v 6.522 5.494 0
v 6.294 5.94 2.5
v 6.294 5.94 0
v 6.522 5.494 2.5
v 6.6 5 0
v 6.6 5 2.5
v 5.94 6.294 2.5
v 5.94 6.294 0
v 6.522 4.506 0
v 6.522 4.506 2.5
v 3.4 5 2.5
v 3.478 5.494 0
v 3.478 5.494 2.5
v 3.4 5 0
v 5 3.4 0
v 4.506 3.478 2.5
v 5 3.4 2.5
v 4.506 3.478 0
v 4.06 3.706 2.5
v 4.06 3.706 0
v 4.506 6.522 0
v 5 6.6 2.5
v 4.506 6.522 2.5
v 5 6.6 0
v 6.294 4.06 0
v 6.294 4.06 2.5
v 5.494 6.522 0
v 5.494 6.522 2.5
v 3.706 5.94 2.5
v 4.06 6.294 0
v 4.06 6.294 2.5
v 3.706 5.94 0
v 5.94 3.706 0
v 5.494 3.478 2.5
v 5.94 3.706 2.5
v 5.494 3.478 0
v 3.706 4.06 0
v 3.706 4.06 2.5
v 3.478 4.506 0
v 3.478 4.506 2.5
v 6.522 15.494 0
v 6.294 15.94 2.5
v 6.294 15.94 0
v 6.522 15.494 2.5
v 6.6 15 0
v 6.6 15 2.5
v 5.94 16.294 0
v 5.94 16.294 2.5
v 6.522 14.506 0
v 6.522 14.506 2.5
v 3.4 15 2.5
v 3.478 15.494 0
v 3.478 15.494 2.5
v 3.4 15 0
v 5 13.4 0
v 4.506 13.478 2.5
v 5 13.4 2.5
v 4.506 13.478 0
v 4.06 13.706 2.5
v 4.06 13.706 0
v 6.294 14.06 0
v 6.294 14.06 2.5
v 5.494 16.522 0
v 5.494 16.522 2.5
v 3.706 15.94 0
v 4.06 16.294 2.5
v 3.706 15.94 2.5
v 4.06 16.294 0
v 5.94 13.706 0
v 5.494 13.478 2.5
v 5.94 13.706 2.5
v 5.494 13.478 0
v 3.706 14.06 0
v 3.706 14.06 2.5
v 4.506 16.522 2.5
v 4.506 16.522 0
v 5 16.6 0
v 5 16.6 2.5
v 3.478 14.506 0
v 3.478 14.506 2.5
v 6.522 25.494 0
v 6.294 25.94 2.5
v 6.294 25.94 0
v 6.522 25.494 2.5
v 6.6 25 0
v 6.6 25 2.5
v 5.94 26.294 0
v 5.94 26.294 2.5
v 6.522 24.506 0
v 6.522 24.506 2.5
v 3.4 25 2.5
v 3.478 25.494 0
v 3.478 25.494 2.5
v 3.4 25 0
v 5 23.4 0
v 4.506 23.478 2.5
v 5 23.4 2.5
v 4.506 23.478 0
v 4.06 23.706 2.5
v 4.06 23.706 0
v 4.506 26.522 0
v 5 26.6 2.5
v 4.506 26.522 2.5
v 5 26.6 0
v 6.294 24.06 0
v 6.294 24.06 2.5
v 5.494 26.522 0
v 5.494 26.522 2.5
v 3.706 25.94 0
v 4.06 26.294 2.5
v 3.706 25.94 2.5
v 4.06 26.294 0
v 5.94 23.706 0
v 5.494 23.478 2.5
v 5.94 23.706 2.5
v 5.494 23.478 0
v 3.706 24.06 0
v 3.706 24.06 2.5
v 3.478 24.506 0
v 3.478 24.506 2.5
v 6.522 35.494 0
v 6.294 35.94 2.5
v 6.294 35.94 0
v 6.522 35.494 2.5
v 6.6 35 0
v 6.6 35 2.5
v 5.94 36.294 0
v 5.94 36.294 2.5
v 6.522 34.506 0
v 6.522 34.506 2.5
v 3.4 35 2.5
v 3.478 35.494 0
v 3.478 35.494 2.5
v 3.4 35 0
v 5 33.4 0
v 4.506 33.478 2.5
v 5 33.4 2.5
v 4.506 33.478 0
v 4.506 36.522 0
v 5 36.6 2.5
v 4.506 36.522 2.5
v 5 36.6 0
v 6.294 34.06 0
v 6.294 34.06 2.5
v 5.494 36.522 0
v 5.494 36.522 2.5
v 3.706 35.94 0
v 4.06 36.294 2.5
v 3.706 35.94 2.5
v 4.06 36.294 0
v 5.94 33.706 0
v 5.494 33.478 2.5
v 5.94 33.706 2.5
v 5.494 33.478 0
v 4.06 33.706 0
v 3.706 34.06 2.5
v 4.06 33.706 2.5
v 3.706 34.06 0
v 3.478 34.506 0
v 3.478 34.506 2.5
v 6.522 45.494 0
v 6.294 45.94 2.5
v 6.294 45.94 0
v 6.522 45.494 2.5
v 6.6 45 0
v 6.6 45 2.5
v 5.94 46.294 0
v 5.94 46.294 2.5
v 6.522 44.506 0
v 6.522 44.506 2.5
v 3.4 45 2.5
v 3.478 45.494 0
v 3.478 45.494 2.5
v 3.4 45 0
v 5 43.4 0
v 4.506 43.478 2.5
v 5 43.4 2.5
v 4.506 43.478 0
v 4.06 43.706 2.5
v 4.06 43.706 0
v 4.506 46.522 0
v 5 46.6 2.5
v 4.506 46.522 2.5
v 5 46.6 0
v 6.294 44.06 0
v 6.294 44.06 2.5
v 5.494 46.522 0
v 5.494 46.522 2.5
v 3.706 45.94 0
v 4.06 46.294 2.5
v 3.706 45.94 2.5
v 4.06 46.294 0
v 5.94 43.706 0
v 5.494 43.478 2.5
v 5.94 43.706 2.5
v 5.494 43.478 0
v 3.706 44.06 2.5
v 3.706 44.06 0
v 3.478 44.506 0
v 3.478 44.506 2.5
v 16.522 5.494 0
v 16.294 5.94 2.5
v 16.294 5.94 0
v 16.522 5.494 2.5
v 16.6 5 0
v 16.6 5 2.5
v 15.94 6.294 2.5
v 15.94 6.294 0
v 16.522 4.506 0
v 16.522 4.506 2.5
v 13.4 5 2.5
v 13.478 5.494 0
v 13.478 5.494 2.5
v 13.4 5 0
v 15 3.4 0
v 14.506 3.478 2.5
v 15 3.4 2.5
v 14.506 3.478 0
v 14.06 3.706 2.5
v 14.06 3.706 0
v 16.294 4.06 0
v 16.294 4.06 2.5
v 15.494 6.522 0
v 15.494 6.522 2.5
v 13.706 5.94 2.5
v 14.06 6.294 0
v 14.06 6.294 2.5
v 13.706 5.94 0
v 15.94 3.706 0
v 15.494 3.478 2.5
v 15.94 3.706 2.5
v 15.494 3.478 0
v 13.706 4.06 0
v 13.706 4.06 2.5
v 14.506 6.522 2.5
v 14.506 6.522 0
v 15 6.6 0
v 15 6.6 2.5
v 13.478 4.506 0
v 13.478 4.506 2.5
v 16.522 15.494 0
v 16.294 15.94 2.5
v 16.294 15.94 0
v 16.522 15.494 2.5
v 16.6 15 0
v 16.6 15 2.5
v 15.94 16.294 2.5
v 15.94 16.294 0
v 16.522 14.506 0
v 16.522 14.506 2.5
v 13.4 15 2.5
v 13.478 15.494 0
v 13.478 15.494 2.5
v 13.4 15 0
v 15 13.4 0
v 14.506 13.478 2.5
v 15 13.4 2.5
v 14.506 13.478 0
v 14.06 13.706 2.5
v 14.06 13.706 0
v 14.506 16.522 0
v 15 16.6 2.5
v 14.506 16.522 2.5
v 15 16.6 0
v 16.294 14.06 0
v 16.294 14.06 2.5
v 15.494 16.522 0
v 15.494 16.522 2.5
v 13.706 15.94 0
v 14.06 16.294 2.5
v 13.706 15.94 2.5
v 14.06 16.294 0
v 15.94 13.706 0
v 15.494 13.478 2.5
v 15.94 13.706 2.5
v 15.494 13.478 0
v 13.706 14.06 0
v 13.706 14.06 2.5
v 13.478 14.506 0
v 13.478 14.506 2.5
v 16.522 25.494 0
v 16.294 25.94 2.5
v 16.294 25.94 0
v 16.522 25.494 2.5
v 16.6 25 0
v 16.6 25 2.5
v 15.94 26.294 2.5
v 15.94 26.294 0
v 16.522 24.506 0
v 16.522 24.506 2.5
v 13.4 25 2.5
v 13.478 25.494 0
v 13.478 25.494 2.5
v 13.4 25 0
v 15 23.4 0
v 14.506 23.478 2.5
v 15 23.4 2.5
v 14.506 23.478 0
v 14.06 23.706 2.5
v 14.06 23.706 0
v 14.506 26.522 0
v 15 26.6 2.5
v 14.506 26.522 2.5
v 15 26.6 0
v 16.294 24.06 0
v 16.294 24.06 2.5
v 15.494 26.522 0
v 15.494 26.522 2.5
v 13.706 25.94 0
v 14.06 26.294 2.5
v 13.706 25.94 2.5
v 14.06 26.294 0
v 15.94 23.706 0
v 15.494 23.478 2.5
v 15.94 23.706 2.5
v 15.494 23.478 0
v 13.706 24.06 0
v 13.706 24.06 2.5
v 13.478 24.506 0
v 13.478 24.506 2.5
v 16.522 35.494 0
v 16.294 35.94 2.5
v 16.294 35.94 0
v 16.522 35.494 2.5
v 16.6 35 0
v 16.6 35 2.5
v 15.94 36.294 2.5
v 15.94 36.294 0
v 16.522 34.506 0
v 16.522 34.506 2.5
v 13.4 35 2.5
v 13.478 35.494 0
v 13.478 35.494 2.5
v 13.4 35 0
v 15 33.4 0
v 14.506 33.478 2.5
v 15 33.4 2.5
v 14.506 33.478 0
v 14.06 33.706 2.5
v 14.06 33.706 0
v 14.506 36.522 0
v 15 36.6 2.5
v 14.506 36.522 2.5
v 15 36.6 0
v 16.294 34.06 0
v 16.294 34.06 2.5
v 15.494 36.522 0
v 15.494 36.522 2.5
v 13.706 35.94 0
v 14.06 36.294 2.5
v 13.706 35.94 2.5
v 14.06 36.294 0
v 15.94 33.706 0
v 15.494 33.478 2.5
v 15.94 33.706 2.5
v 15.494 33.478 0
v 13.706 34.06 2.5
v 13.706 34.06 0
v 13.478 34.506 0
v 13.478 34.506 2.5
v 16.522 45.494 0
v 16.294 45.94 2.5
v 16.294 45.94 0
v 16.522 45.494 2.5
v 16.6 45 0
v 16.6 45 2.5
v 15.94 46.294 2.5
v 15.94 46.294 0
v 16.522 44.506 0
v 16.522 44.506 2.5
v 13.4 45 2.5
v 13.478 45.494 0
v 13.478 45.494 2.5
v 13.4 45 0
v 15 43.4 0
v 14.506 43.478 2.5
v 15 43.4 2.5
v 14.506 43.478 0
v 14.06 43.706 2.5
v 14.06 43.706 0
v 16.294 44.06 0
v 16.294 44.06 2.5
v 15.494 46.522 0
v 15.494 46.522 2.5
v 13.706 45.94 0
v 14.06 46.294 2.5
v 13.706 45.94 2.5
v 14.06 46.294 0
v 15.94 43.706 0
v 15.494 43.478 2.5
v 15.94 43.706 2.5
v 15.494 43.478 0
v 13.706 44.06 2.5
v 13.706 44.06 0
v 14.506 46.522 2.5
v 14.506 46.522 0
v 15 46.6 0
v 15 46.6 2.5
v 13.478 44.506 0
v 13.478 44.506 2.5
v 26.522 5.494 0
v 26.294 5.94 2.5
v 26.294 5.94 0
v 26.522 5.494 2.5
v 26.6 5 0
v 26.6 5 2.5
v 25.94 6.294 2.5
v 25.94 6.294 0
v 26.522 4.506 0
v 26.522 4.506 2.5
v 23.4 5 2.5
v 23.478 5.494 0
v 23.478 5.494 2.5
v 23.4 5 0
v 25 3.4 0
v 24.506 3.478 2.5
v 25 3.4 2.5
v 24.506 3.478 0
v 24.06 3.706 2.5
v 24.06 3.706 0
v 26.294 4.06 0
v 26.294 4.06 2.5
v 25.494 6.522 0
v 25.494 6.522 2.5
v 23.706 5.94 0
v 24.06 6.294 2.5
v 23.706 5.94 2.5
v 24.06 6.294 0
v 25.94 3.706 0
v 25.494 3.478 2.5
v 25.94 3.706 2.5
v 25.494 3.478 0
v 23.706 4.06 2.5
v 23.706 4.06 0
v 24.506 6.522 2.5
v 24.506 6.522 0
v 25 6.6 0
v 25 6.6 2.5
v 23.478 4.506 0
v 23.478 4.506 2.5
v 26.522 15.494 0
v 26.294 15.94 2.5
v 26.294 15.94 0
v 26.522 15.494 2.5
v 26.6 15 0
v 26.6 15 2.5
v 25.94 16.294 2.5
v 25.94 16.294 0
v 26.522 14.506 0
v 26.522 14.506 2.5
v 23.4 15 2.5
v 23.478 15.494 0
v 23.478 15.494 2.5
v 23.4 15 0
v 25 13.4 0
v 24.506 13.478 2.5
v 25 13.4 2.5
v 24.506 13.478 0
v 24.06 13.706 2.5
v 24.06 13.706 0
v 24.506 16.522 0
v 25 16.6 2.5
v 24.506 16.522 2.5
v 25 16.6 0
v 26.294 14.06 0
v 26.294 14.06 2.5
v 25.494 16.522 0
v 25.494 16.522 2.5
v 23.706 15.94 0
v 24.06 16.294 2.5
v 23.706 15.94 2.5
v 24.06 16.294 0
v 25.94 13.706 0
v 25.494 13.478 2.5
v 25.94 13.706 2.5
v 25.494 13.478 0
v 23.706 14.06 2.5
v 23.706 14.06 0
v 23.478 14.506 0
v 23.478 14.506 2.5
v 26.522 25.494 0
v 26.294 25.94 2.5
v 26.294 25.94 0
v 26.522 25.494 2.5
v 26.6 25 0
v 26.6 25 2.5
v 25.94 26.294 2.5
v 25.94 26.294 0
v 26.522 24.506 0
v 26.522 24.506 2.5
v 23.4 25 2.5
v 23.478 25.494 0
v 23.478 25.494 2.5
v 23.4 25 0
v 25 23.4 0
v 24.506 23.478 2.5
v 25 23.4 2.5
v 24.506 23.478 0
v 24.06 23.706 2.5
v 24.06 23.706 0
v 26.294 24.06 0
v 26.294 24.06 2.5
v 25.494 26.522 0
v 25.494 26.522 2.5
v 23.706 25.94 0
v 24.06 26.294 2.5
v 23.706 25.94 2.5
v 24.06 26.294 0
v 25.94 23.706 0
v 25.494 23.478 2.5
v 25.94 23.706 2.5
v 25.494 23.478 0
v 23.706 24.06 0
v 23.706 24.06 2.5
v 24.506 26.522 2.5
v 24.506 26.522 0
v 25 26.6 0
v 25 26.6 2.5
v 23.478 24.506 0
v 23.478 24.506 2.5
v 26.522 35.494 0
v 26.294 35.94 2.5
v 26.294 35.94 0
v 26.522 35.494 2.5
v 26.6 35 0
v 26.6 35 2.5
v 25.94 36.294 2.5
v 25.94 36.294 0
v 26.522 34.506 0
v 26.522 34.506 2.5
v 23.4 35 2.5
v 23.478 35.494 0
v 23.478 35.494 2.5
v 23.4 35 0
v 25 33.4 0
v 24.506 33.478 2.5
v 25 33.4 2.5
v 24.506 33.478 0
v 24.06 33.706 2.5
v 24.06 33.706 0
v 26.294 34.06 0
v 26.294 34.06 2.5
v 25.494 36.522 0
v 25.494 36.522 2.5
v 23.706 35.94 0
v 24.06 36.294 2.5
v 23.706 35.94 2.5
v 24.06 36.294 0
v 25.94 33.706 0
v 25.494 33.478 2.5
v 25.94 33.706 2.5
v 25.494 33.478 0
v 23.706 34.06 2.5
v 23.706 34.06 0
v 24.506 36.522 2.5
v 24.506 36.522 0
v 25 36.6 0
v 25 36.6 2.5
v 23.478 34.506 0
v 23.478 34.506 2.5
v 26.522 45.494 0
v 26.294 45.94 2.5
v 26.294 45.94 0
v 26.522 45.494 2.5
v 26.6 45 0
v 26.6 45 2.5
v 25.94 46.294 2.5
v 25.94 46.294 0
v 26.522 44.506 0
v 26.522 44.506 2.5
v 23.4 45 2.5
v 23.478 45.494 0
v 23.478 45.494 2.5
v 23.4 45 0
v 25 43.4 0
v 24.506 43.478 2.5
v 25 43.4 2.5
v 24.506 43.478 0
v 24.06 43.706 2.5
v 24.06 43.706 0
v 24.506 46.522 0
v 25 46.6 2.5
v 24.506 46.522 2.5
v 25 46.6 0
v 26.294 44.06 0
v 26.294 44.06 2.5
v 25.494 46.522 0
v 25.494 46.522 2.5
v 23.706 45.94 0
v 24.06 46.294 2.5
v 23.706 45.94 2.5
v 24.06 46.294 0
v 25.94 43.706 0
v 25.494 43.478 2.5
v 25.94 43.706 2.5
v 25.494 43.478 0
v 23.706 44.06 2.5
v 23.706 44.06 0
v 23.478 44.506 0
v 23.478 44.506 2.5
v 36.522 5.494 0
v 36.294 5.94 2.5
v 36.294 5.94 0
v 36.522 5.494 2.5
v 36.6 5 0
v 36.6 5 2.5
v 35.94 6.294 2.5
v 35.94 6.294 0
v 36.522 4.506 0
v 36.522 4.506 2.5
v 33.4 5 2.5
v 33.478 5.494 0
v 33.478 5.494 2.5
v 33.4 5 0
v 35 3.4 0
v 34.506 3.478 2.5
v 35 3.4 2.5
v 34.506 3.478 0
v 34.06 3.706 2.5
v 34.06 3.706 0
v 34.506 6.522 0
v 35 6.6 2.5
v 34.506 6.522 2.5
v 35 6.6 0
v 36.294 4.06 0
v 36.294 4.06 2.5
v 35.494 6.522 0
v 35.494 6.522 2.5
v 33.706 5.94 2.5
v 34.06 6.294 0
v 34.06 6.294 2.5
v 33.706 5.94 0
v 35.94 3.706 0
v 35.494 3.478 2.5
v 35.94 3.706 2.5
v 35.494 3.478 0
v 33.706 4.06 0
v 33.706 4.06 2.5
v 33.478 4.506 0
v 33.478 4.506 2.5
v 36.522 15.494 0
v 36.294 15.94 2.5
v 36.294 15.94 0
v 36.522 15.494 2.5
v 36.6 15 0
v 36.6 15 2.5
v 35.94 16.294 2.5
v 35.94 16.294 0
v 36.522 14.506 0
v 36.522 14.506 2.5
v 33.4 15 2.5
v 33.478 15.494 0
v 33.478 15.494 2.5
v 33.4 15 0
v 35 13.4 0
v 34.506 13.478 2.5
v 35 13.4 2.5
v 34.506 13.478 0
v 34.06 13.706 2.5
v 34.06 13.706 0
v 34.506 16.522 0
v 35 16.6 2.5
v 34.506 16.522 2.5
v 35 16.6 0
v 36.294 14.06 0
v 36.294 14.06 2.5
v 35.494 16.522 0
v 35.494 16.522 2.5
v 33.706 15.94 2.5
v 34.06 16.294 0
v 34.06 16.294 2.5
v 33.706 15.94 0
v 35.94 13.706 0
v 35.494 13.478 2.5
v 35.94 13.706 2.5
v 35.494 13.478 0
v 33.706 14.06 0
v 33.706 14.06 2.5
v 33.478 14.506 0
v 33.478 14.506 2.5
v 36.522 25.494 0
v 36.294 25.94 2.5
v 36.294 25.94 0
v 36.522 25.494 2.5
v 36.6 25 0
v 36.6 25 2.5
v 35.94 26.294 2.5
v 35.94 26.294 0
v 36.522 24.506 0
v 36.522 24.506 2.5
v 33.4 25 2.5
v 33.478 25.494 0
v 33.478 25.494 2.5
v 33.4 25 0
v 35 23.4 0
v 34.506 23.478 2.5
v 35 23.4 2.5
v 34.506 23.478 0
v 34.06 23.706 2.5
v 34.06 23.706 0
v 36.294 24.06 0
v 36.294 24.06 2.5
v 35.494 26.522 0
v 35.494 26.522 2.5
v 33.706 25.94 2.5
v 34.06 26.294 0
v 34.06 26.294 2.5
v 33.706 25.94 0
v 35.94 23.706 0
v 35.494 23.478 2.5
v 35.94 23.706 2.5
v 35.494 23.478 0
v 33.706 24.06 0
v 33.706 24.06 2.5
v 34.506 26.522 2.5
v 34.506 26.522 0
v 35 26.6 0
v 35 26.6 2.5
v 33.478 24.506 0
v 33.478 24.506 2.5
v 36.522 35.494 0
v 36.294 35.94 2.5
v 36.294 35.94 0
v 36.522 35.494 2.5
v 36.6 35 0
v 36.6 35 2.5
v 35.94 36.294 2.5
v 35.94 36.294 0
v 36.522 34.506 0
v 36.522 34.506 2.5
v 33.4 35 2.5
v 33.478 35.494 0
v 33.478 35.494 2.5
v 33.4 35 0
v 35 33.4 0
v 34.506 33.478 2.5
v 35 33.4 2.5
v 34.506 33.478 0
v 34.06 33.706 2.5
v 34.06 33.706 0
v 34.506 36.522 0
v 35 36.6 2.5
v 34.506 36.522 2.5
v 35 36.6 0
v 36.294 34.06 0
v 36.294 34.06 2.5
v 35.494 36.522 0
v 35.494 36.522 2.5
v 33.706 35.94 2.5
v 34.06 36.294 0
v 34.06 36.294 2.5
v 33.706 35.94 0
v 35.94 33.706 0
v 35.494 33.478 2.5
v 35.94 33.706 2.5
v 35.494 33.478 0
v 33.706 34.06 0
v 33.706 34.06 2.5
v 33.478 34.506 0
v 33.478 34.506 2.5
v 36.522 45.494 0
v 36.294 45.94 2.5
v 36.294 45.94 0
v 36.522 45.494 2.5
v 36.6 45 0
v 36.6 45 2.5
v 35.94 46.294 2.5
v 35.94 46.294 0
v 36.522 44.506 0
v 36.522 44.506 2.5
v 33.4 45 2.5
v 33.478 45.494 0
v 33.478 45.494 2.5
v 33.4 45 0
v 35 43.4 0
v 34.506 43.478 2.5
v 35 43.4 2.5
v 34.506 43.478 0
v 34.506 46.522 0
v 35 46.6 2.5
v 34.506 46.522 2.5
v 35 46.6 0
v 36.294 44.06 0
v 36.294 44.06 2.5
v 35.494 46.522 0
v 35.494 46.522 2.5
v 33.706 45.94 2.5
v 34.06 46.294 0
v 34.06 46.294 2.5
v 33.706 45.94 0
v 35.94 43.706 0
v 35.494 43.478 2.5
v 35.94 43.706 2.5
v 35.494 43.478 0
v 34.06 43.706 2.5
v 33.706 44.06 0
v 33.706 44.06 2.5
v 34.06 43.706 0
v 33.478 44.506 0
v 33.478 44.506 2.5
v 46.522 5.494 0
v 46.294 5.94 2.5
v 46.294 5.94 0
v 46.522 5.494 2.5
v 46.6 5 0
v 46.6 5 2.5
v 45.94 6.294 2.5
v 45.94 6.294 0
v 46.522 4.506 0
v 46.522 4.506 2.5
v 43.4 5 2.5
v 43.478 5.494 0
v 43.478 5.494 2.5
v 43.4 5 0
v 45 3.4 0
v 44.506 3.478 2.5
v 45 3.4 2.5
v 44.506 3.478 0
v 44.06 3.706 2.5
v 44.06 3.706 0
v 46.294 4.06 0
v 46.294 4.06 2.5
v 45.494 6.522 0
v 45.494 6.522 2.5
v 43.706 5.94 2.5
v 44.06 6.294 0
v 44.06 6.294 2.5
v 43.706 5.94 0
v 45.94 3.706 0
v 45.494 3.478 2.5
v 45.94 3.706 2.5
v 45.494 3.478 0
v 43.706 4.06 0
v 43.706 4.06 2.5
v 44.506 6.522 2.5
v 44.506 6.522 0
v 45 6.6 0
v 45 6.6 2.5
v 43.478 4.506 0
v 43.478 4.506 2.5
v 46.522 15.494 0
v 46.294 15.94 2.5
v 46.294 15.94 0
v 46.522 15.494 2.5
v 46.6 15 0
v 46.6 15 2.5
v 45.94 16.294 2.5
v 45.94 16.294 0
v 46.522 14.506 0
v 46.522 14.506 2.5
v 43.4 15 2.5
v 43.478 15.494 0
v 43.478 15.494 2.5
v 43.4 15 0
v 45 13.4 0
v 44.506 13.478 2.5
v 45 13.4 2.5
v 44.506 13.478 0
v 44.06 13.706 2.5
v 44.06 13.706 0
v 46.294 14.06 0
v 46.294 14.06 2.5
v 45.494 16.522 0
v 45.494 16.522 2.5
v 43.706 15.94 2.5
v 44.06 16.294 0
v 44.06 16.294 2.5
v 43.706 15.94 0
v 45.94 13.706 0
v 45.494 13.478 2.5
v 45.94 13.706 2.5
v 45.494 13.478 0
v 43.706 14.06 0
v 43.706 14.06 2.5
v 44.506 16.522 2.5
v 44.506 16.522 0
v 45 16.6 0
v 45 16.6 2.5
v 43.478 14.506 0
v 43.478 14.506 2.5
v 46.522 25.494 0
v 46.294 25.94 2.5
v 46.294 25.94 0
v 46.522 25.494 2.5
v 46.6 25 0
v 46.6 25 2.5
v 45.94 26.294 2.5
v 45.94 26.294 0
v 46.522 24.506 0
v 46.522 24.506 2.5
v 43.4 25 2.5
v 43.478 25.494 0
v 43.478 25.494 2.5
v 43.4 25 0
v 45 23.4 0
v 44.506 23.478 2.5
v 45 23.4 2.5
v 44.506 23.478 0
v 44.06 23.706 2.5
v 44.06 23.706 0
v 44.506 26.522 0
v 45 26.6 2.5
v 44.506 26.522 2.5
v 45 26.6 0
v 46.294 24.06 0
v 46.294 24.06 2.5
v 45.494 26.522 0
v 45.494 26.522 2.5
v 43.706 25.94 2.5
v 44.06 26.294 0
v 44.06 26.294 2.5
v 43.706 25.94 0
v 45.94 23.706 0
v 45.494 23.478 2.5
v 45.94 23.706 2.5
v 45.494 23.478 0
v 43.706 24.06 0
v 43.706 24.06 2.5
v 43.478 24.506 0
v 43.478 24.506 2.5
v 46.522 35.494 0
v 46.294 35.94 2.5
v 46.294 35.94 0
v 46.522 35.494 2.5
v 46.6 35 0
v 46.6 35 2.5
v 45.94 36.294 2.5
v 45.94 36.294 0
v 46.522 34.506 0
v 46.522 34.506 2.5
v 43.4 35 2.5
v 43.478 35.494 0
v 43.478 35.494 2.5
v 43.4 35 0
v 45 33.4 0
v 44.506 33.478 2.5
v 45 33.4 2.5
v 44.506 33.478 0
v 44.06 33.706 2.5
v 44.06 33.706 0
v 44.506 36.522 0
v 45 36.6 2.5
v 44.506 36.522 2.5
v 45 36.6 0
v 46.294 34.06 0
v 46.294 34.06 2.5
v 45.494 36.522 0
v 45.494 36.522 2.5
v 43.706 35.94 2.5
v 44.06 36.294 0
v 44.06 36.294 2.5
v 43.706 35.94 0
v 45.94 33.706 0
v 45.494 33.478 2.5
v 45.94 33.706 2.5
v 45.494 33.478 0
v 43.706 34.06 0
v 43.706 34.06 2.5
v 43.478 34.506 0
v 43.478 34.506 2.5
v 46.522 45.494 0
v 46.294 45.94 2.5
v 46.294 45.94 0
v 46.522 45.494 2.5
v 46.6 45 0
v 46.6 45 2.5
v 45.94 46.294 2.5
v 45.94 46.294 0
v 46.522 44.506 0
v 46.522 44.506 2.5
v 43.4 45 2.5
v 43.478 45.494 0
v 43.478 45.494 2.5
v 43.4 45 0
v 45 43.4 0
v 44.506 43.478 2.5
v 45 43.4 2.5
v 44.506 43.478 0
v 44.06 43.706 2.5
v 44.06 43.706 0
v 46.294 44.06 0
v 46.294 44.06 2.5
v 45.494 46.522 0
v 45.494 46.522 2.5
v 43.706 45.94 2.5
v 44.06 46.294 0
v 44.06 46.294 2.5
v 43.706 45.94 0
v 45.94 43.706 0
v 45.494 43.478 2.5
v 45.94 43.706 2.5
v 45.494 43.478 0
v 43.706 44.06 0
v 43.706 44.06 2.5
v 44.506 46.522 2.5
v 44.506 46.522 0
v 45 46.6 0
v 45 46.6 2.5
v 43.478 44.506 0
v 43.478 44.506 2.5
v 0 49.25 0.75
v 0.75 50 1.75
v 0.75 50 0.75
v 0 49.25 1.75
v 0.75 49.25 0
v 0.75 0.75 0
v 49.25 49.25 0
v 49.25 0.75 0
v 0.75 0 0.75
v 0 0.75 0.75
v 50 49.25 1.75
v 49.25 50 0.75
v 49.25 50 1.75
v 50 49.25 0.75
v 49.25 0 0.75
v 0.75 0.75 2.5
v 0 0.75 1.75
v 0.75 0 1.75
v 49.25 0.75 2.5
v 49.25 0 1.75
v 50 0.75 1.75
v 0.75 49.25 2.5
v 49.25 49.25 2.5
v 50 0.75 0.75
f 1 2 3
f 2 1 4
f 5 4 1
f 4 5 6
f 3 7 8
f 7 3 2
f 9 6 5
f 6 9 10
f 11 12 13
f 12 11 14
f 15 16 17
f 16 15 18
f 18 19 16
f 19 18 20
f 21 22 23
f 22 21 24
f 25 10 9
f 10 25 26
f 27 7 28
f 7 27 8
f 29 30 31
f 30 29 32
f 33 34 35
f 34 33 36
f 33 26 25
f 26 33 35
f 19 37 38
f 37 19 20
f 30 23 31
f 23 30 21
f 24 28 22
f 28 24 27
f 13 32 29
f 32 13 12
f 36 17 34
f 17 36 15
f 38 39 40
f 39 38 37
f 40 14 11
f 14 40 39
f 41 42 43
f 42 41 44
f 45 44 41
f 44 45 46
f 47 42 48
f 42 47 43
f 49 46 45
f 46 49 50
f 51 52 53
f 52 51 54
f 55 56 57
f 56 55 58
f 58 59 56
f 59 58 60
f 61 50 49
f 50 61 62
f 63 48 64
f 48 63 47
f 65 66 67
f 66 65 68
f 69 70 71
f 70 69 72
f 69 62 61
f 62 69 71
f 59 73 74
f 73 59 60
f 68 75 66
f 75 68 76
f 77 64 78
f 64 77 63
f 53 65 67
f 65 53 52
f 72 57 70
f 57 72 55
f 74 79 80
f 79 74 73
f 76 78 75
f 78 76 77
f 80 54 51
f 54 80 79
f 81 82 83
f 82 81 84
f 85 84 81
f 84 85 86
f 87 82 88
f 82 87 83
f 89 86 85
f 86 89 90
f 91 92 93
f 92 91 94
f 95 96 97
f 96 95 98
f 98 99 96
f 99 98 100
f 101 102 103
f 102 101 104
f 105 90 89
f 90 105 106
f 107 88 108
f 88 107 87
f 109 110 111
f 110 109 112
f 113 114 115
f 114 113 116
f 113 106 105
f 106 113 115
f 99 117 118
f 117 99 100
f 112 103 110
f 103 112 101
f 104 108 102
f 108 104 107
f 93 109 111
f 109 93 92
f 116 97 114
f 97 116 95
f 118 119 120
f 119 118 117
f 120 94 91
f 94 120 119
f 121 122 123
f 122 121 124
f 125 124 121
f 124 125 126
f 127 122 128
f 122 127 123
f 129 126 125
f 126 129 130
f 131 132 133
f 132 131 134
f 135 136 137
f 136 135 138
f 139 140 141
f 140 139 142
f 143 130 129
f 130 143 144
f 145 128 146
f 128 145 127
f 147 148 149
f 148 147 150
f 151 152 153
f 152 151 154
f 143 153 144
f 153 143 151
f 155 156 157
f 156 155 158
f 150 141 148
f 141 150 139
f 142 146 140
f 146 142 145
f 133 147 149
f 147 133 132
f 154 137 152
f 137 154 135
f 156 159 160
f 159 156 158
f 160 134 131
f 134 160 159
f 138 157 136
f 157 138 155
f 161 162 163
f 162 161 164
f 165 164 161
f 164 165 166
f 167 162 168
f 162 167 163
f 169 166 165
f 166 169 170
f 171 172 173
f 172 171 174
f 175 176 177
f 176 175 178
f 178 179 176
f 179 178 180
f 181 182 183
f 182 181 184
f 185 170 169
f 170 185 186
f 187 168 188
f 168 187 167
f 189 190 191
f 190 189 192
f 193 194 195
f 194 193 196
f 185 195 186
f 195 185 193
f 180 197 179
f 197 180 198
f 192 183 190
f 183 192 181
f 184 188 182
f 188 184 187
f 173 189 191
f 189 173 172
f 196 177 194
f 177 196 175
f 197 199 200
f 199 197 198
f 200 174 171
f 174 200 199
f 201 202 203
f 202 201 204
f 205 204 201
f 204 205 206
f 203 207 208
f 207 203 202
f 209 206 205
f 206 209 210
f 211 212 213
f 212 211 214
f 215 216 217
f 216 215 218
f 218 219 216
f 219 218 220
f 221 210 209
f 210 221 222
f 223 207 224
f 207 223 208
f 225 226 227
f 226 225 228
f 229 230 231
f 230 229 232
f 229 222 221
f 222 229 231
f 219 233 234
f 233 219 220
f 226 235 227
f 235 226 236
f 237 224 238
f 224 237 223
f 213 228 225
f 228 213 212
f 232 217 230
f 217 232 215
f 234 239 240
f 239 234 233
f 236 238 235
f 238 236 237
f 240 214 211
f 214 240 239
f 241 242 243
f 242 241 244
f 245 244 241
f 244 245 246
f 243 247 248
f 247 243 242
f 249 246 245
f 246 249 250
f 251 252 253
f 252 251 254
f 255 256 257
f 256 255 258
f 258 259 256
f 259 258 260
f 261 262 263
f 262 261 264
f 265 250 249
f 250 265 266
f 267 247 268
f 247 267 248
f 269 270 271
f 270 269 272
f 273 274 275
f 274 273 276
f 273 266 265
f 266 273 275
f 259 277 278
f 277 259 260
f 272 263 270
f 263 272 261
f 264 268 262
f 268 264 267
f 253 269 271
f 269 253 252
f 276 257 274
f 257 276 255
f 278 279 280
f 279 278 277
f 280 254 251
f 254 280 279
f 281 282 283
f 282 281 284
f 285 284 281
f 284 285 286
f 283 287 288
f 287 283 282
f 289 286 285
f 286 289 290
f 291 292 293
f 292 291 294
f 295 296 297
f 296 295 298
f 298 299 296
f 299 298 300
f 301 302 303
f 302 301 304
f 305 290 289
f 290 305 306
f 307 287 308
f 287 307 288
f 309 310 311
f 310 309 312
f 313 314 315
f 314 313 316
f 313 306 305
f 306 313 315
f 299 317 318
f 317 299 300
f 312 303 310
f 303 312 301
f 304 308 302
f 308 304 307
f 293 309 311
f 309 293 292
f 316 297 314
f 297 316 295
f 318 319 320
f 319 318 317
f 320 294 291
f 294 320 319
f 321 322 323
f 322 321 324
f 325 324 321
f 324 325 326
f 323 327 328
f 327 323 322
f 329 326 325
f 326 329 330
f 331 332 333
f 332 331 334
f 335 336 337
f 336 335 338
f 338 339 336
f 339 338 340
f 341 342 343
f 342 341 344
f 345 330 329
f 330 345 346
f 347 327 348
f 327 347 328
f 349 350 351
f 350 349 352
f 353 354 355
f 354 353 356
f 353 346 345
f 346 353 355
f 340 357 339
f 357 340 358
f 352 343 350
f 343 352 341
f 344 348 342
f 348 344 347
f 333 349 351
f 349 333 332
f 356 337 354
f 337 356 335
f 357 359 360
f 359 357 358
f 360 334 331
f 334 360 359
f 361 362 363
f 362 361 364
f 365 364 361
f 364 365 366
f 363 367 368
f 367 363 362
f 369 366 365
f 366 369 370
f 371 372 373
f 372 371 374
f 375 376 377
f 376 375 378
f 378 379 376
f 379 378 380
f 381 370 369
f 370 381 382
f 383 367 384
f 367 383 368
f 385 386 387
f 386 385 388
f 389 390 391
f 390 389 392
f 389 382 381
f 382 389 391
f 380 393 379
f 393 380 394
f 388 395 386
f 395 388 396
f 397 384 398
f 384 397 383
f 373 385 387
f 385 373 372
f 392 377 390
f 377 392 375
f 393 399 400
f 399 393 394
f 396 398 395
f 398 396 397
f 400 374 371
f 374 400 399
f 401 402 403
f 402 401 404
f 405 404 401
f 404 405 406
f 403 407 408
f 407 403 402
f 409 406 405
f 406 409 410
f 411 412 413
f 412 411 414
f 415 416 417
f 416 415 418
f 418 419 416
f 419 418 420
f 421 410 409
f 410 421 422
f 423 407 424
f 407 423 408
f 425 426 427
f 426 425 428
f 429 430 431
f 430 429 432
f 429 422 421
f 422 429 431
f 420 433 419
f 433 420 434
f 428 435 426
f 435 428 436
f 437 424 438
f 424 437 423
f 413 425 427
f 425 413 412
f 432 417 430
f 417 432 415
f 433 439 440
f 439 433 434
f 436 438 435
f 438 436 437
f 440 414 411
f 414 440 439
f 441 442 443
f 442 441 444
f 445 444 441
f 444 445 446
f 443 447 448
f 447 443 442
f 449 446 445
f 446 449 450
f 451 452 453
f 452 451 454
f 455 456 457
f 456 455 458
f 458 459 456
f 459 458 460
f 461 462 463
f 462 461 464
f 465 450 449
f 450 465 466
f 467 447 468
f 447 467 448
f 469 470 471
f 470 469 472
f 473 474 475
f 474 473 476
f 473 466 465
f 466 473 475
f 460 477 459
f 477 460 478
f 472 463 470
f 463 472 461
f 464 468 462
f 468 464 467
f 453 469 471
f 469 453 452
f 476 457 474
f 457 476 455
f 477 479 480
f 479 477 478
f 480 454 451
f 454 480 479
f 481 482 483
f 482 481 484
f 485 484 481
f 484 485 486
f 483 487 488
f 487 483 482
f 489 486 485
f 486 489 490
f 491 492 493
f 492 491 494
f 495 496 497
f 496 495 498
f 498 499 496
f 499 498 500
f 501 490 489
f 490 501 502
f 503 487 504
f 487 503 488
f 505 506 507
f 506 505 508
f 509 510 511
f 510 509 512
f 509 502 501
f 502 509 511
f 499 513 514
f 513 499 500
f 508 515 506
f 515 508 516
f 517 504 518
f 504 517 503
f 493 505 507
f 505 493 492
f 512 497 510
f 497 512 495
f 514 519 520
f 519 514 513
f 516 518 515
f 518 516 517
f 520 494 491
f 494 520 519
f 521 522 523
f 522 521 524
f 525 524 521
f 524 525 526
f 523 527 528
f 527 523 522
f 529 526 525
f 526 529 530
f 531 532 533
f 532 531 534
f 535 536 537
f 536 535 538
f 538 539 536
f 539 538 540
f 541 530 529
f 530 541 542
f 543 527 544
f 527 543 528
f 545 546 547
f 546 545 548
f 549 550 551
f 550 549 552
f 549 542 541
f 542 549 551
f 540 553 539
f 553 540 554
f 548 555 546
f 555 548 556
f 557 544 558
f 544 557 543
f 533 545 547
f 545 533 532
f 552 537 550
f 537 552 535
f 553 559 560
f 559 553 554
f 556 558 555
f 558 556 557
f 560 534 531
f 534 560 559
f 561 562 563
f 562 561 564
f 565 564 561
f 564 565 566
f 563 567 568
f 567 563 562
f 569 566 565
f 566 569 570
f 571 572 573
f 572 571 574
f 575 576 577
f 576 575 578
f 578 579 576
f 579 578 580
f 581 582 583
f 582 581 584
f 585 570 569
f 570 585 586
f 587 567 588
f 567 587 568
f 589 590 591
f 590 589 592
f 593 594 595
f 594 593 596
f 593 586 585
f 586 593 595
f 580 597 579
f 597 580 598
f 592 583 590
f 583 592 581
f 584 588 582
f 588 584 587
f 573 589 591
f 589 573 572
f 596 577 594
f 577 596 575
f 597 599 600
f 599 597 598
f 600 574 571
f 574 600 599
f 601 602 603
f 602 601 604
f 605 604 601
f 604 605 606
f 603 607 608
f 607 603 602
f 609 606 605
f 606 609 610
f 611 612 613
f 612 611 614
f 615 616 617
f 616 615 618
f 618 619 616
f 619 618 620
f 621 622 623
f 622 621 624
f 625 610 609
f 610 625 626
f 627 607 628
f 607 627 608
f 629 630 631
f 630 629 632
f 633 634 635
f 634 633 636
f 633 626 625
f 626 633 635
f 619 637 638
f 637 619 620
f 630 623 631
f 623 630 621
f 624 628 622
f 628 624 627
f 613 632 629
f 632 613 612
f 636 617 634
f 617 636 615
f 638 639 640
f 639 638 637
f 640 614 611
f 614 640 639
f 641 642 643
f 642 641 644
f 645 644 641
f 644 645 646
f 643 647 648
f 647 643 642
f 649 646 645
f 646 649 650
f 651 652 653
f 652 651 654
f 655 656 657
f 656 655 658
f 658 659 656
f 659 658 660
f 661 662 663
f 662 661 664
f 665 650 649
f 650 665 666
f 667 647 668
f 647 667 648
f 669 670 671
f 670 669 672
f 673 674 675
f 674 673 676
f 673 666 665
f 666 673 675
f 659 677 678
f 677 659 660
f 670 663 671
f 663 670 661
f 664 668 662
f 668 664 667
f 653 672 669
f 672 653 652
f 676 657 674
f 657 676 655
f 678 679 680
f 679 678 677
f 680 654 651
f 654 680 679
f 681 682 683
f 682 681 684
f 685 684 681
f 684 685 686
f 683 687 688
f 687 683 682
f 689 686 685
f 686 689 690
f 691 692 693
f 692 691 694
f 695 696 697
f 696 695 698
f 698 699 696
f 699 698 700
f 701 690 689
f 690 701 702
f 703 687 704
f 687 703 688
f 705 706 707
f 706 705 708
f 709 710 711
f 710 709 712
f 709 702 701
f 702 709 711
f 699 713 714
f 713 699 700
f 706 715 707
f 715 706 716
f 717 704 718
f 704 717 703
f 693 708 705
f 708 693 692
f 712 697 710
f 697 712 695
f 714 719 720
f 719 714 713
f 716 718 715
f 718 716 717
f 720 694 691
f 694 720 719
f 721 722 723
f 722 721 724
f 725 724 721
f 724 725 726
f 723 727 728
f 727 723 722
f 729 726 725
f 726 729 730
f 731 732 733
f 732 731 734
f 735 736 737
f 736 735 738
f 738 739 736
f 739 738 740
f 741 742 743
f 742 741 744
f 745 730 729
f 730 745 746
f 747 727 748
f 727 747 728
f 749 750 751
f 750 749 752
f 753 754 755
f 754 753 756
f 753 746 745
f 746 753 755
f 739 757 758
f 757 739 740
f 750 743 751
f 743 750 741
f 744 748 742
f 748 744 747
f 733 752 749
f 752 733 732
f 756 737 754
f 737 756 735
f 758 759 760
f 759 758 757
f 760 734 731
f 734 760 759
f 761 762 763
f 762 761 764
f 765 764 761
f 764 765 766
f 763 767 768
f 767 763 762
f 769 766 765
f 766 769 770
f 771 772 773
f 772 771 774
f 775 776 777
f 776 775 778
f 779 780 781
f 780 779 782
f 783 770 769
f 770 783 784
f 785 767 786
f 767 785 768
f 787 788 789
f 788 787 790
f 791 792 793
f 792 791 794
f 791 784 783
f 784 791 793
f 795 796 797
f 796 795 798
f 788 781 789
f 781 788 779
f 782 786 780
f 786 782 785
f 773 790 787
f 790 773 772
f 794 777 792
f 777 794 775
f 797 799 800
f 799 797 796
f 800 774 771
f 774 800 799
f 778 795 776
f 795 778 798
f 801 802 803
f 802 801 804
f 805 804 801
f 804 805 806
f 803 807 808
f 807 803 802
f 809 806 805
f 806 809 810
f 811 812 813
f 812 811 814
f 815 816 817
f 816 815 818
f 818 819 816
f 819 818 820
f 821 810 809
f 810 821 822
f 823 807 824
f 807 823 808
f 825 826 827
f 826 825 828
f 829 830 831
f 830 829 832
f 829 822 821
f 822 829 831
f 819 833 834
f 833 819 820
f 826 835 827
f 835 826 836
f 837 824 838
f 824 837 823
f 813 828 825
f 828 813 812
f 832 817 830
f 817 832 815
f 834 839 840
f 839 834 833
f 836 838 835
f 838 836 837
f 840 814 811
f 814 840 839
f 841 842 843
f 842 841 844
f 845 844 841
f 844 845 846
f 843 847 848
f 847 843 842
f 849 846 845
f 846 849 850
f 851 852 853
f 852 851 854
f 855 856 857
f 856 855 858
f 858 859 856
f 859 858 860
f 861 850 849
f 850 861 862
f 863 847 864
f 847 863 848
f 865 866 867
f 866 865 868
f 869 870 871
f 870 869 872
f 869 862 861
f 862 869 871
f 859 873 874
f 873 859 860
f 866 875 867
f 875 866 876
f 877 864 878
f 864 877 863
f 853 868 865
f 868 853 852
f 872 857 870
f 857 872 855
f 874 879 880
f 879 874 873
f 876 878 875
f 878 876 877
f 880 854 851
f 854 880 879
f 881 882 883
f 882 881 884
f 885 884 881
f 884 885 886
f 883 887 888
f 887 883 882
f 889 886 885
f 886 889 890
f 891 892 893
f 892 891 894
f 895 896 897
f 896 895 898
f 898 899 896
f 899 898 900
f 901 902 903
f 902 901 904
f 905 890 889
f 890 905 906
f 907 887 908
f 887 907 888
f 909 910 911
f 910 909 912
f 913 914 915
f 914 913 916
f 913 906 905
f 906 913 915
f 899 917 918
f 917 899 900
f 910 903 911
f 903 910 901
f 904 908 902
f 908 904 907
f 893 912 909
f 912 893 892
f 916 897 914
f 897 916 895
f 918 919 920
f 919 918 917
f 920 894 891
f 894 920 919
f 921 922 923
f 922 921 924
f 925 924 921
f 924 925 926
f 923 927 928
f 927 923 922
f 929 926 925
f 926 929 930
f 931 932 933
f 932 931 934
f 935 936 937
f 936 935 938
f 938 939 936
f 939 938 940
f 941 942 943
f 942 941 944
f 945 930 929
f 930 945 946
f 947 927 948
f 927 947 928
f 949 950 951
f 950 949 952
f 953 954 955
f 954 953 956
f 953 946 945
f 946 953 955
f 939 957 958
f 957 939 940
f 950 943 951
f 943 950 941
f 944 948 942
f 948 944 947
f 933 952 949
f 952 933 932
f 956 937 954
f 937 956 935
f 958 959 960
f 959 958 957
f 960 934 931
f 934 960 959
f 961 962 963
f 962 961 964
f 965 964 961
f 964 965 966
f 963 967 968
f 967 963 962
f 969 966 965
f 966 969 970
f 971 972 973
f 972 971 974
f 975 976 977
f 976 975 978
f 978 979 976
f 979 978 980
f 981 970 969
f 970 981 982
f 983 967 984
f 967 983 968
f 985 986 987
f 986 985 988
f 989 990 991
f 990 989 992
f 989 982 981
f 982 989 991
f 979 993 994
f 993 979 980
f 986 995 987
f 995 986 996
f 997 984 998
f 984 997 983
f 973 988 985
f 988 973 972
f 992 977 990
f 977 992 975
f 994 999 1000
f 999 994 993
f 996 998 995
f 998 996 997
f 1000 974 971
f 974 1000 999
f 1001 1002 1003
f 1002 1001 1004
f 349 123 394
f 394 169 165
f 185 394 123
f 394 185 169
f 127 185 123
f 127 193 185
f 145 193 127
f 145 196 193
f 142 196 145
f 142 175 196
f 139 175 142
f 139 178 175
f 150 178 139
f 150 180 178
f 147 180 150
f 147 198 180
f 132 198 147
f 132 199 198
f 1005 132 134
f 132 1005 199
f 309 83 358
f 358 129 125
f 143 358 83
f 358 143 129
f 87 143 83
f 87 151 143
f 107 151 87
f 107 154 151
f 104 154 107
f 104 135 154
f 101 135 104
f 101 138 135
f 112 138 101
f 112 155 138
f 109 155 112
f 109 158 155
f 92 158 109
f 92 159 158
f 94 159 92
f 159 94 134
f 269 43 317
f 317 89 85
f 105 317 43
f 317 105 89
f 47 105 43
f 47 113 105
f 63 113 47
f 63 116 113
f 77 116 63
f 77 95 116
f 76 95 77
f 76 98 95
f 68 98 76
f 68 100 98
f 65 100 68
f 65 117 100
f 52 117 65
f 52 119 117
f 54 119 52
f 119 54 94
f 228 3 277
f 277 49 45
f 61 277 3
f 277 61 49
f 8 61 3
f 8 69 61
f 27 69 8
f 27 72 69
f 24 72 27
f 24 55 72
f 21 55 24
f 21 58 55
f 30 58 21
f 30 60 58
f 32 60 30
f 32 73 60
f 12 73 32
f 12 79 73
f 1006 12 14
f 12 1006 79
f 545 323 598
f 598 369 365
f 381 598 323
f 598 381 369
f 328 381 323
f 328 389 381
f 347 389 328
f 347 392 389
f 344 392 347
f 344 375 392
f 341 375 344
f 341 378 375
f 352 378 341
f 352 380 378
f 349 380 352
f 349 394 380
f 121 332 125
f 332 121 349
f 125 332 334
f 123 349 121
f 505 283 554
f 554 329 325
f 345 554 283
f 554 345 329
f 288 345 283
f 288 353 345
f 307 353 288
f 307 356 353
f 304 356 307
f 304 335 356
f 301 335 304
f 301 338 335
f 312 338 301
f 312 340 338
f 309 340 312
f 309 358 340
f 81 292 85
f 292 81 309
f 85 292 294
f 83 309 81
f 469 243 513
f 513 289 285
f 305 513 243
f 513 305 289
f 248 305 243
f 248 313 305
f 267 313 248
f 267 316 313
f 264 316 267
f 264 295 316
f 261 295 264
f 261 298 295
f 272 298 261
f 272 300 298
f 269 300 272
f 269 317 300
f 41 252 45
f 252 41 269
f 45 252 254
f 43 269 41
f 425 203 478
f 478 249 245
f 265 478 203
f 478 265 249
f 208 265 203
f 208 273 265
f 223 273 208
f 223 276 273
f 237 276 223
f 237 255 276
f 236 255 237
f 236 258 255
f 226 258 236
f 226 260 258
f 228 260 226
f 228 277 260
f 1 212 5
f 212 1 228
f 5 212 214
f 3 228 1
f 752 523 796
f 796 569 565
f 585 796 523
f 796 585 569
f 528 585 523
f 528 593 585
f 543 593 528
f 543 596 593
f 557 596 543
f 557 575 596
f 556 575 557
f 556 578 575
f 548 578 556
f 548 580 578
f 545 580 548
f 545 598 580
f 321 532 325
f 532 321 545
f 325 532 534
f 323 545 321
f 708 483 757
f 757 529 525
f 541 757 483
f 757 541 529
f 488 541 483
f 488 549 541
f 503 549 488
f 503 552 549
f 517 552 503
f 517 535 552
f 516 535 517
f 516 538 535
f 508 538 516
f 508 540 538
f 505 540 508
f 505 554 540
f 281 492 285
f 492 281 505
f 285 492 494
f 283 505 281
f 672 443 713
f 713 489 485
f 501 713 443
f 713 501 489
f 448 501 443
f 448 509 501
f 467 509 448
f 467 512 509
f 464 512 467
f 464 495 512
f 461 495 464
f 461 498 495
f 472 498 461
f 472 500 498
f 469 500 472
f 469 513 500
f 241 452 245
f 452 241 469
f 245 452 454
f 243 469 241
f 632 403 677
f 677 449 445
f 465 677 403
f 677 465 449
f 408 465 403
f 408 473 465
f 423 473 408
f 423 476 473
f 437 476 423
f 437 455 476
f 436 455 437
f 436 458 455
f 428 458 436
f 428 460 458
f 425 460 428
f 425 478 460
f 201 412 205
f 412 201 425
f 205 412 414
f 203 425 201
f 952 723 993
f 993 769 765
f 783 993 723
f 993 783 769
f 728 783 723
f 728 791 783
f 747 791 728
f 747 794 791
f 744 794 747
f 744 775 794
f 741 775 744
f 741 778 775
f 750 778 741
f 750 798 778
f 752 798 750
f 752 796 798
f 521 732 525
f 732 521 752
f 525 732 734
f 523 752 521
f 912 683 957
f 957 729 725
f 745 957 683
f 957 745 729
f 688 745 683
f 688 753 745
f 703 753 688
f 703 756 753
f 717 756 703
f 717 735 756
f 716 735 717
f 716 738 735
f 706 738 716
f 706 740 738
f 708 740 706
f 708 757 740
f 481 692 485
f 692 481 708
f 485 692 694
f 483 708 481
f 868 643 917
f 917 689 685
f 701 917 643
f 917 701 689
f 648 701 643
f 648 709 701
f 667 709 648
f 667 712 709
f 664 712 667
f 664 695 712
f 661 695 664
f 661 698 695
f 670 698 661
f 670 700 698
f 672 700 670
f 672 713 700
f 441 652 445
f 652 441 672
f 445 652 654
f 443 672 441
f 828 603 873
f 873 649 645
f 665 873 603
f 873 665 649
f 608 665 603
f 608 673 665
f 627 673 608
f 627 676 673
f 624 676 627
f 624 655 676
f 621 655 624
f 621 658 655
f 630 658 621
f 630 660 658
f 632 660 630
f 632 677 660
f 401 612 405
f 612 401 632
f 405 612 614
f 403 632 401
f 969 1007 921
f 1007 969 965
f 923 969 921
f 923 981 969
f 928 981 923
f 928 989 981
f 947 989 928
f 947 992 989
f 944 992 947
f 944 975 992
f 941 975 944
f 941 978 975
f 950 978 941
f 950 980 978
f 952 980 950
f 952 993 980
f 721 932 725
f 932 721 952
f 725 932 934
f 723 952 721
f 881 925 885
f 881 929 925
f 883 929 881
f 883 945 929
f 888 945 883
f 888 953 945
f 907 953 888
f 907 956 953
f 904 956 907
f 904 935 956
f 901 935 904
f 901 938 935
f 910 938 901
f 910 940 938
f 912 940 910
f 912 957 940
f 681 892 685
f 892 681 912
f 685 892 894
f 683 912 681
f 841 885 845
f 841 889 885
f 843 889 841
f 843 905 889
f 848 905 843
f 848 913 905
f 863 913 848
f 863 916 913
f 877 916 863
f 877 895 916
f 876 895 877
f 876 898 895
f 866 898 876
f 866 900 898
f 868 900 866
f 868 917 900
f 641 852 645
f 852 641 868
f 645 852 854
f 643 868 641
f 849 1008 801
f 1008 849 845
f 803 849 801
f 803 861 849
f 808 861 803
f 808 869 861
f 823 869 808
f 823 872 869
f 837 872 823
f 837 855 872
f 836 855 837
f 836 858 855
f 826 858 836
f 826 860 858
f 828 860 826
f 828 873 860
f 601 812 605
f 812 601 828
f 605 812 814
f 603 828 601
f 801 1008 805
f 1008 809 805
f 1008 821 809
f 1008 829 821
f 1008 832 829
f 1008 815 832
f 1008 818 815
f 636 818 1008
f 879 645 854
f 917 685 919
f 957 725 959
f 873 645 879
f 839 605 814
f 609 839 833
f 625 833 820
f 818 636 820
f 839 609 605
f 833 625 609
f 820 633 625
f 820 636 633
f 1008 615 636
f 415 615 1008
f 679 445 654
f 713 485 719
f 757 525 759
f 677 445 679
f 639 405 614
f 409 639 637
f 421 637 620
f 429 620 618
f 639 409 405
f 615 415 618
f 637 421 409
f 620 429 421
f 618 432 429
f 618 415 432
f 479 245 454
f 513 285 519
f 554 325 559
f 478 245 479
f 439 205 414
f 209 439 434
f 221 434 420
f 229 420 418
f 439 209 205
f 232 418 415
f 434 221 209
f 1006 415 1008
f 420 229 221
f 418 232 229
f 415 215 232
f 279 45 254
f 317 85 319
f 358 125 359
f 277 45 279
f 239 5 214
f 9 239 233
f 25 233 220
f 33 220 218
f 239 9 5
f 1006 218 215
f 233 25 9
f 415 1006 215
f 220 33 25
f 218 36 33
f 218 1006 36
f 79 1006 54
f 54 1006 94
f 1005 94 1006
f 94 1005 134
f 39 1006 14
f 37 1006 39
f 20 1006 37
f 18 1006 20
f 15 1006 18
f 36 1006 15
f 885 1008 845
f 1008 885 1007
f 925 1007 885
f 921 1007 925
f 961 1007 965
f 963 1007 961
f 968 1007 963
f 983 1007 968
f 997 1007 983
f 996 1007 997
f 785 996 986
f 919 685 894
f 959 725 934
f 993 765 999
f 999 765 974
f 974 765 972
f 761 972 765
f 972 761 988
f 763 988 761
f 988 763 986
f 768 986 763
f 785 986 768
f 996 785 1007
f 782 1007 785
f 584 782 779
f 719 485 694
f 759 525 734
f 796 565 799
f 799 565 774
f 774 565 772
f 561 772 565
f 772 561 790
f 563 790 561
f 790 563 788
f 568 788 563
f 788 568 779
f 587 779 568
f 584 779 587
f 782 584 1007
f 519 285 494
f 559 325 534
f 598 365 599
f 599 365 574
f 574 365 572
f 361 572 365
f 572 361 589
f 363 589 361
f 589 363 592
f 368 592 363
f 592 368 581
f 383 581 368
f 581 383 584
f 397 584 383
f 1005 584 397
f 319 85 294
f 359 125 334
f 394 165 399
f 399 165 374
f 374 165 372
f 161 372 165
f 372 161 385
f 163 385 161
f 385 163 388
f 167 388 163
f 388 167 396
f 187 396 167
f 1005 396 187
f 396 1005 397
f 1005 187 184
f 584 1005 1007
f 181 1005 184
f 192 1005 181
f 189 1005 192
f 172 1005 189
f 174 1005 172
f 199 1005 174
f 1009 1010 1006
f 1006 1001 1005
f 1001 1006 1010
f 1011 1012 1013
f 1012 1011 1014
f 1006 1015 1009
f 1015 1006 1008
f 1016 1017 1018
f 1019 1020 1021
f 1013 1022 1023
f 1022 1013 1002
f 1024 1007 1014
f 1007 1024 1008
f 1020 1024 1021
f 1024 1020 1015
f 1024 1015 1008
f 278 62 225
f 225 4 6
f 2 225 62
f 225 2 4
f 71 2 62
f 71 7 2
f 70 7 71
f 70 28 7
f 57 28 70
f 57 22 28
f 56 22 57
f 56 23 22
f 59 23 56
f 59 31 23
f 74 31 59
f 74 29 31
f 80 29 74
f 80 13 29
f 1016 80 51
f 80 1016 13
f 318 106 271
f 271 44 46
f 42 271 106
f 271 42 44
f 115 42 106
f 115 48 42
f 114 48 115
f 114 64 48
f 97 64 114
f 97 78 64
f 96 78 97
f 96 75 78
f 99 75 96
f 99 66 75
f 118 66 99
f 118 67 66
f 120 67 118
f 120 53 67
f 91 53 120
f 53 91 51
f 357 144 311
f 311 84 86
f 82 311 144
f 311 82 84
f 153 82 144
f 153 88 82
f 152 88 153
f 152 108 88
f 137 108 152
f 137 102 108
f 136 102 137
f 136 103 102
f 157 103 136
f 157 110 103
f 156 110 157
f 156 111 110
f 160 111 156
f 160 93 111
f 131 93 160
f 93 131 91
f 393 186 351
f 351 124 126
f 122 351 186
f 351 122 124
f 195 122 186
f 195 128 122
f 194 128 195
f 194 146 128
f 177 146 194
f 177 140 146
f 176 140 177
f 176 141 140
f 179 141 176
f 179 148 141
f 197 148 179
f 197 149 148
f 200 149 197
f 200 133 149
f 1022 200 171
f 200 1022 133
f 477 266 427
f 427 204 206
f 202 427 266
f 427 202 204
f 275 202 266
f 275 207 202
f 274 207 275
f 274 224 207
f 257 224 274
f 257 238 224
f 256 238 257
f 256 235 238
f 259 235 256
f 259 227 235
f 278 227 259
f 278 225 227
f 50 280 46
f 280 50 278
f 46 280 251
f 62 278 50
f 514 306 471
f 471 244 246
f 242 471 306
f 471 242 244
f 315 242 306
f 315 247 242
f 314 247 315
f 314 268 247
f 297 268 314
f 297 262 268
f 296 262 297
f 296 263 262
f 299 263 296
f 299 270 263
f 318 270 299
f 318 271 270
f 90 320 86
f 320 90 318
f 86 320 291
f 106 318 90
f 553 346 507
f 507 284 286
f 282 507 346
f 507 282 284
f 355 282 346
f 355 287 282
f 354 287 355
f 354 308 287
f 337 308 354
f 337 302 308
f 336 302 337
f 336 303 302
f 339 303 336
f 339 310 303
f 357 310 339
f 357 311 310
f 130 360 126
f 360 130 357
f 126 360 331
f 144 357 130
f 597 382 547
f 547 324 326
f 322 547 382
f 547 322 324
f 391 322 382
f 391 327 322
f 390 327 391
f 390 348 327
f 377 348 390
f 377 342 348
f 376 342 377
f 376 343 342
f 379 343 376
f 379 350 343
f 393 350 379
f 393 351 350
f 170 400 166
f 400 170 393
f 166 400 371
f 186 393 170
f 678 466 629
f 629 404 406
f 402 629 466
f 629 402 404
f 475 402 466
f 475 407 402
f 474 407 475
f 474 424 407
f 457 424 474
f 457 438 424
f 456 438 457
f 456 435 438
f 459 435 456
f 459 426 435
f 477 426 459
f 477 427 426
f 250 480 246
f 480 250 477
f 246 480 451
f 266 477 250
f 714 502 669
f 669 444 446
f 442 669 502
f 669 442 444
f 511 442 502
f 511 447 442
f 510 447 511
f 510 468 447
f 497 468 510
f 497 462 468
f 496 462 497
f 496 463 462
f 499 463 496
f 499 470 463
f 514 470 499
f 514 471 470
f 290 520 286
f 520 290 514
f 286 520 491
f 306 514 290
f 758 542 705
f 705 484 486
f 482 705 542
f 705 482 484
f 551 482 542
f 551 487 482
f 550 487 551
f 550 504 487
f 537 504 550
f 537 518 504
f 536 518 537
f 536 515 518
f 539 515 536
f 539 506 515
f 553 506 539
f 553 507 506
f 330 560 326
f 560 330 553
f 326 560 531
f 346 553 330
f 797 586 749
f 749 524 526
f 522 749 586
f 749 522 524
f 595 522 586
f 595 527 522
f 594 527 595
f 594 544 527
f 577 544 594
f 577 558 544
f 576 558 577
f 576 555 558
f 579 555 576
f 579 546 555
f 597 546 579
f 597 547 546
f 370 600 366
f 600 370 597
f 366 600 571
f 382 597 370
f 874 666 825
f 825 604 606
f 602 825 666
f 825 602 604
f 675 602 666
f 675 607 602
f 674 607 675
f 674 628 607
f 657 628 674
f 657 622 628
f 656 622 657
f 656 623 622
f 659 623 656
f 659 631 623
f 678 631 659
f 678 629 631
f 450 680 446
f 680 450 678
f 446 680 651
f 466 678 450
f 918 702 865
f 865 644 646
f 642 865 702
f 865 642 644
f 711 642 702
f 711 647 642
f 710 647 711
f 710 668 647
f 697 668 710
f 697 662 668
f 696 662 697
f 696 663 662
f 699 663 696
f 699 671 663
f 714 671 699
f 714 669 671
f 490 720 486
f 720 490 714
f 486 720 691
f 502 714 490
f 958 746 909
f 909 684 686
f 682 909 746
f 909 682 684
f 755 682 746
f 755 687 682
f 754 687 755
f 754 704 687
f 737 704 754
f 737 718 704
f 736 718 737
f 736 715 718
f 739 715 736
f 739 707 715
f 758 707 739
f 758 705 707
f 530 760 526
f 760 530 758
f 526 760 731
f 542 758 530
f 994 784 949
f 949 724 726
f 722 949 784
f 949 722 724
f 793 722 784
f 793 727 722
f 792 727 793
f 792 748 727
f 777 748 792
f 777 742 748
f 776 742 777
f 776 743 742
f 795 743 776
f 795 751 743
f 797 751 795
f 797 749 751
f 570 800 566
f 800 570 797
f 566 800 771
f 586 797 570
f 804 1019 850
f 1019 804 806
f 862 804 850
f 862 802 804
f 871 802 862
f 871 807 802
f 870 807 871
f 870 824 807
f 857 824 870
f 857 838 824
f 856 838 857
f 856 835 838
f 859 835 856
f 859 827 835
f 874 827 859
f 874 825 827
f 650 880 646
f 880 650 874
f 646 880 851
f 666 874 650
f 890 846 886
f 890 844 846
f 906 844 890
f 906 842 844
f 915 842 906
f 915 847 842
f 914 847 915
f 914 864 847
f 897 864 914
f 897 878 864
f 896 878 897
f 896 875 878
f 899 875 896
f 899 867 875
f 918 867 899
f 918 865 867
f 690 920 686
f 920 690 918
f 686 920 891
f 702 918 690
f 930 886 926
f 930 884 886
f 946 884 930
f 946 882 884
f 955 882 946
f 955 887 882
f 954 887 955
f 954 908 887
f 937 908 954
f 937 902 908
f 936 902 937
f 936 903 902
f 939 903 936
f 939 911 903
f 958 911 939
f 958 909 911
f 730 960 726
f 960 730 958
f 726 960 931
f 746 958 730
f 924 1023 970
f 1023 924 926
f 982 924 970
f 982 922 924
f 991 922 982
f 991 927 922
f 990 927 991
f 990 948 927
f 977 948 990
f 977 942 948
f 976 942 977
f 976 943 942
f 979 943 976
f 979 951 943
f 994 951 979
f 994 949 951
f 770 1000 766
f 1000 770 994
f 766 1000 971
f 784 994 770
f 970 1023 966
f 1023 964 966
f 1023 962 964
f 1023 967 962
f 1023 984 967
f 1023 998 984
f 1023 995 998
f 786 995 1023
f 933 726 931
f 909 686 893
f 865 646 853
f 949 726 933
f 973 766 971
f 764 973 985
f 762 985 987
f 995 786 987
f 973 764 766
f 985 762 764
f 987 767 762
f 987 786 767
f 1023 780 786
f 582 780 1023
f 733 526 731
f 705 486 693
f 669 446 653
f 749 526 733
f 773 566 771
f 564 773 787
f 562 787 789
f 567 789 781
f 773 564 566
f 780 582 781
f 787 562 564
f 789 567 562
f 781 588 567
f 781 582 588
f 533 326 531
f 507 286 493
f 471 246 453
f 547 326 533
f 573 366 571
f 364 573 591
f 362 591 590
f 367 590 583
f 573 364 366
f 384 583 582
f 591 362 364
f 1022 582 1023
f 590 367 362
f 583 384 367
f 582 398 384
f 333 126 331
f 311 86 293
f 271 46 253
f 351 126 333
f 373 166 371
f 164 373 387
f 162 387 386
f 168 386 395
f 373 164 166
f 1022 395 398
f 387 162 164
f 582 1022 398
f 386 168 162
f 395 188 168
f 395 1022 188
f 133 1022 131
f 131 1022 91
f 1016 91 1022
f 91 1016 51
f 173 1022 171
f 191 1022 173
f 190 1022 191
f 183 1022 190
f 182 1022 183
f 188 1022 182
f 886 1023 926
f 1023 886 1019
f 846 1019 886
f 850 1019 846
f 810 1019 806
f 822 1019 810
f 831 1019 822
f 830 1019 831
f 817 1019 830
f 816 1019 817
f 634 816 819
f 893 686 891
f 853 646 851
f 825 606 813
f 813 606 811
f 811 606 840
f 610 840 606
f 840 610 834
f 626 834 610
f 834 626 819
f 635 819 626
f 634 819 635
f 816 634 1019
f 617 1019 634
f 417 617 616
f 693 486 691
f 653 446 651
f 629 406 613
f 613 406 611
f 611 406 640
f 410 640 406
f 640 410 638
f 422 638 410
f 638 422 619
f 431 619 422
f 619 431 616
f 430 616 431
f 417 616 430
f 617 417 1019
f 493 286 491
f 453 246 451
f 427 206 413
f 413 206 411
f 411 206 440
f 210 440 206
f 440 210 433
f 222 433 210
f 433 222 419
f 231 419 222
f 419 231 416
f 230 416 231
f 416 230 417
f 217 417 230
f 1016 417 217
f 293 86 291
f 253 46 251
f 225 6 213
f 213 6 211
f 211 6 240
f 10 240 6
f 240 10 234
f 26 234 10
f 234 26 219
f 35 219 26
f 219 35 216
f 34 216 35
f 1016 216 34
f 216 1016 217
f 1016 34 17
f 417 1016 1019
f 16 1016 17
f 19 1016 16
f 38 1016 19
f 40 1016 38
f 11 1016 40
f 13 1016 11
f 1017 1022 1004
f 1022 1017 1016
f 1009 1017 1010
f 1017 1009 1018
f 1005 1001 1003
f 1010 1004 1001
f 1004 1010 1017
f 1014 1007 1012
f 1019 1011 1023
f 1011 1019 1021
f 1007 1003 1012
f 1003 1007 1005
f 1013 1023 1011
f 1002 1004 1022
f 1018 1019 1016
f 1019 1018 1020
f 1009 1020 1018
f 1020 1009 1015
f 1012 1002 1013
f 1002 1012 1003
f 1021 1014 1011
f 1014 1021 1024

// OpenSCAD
/*  
        Flat.scad
        M3Z core library 1.0.0
*/

//BEGIN OPTIONS - edit these parameters to generate custom parts of this form.

N = 5; //whole number of 10mm units along the X axis
M = 5; //whole number of 10mm units along the Y axis

THICKNESS = 2.5; //Nominal 2.5mm - thickness of the walls of the part

CHAMFER_DEPTH = 0.75; //Default 0.75mm

HOLE_DIAMETER = 3.2; //Nominal 3.0mm - common diameter of holes throughout

HOLE_FACES = 15; //Default 20 - higher number => slower render, smoother holes

//END OPTIONS - edit all else at your own risk

//Modules

module chamferCube(dimensions,depth){
    //where dimensions is a vector e.g. [10,20,30] and depth is the depth of the chamfer.
    
    f=2*depth;
    
    octaPoints = [ 
                    [1,0,0],
                    [0,1,0],
                    [-1,0,0],
                    [0,-1,0],
                    [0,0,1],
                    [0,0,-1]
                ];

    octaFaces = [   
                    [0,4,1],
                    [1,4,2],
                    [2,4,3],
                    [3,4,0],
                    [0,1,5],
                    [1,2,5],
                    [2,3,5],
                    [3,0,5] 
                ];
    translate([depth,depth,depth])
    minkowski(){
        cube([dimensions[0]-f,dimensions[1]-f,dimensions[2]-f]);
        polyhedron(octaPoints*depth, octaFaces);
    }
}

//variables (derived and not to be edited)

bodyWidth = N * 10;
bodyLength = M * 10;
bodyHeight = THICKNESS;
bodyDims = [bodyWidth,bodyLength,bodyHeight];

//Part Generating Code
difference(){
    chamferCube(bodyDims,CHAMFER_DEPTH);
    for(i = [0:N-1]){
        for(j = [0:M-1]){
            translate([5+(10*i),5+(10*j),0]){
                cylinder(h = 10, d = HOLE_DIAMETER, center = true, $fn = 20);
            }
        }
    }
}
